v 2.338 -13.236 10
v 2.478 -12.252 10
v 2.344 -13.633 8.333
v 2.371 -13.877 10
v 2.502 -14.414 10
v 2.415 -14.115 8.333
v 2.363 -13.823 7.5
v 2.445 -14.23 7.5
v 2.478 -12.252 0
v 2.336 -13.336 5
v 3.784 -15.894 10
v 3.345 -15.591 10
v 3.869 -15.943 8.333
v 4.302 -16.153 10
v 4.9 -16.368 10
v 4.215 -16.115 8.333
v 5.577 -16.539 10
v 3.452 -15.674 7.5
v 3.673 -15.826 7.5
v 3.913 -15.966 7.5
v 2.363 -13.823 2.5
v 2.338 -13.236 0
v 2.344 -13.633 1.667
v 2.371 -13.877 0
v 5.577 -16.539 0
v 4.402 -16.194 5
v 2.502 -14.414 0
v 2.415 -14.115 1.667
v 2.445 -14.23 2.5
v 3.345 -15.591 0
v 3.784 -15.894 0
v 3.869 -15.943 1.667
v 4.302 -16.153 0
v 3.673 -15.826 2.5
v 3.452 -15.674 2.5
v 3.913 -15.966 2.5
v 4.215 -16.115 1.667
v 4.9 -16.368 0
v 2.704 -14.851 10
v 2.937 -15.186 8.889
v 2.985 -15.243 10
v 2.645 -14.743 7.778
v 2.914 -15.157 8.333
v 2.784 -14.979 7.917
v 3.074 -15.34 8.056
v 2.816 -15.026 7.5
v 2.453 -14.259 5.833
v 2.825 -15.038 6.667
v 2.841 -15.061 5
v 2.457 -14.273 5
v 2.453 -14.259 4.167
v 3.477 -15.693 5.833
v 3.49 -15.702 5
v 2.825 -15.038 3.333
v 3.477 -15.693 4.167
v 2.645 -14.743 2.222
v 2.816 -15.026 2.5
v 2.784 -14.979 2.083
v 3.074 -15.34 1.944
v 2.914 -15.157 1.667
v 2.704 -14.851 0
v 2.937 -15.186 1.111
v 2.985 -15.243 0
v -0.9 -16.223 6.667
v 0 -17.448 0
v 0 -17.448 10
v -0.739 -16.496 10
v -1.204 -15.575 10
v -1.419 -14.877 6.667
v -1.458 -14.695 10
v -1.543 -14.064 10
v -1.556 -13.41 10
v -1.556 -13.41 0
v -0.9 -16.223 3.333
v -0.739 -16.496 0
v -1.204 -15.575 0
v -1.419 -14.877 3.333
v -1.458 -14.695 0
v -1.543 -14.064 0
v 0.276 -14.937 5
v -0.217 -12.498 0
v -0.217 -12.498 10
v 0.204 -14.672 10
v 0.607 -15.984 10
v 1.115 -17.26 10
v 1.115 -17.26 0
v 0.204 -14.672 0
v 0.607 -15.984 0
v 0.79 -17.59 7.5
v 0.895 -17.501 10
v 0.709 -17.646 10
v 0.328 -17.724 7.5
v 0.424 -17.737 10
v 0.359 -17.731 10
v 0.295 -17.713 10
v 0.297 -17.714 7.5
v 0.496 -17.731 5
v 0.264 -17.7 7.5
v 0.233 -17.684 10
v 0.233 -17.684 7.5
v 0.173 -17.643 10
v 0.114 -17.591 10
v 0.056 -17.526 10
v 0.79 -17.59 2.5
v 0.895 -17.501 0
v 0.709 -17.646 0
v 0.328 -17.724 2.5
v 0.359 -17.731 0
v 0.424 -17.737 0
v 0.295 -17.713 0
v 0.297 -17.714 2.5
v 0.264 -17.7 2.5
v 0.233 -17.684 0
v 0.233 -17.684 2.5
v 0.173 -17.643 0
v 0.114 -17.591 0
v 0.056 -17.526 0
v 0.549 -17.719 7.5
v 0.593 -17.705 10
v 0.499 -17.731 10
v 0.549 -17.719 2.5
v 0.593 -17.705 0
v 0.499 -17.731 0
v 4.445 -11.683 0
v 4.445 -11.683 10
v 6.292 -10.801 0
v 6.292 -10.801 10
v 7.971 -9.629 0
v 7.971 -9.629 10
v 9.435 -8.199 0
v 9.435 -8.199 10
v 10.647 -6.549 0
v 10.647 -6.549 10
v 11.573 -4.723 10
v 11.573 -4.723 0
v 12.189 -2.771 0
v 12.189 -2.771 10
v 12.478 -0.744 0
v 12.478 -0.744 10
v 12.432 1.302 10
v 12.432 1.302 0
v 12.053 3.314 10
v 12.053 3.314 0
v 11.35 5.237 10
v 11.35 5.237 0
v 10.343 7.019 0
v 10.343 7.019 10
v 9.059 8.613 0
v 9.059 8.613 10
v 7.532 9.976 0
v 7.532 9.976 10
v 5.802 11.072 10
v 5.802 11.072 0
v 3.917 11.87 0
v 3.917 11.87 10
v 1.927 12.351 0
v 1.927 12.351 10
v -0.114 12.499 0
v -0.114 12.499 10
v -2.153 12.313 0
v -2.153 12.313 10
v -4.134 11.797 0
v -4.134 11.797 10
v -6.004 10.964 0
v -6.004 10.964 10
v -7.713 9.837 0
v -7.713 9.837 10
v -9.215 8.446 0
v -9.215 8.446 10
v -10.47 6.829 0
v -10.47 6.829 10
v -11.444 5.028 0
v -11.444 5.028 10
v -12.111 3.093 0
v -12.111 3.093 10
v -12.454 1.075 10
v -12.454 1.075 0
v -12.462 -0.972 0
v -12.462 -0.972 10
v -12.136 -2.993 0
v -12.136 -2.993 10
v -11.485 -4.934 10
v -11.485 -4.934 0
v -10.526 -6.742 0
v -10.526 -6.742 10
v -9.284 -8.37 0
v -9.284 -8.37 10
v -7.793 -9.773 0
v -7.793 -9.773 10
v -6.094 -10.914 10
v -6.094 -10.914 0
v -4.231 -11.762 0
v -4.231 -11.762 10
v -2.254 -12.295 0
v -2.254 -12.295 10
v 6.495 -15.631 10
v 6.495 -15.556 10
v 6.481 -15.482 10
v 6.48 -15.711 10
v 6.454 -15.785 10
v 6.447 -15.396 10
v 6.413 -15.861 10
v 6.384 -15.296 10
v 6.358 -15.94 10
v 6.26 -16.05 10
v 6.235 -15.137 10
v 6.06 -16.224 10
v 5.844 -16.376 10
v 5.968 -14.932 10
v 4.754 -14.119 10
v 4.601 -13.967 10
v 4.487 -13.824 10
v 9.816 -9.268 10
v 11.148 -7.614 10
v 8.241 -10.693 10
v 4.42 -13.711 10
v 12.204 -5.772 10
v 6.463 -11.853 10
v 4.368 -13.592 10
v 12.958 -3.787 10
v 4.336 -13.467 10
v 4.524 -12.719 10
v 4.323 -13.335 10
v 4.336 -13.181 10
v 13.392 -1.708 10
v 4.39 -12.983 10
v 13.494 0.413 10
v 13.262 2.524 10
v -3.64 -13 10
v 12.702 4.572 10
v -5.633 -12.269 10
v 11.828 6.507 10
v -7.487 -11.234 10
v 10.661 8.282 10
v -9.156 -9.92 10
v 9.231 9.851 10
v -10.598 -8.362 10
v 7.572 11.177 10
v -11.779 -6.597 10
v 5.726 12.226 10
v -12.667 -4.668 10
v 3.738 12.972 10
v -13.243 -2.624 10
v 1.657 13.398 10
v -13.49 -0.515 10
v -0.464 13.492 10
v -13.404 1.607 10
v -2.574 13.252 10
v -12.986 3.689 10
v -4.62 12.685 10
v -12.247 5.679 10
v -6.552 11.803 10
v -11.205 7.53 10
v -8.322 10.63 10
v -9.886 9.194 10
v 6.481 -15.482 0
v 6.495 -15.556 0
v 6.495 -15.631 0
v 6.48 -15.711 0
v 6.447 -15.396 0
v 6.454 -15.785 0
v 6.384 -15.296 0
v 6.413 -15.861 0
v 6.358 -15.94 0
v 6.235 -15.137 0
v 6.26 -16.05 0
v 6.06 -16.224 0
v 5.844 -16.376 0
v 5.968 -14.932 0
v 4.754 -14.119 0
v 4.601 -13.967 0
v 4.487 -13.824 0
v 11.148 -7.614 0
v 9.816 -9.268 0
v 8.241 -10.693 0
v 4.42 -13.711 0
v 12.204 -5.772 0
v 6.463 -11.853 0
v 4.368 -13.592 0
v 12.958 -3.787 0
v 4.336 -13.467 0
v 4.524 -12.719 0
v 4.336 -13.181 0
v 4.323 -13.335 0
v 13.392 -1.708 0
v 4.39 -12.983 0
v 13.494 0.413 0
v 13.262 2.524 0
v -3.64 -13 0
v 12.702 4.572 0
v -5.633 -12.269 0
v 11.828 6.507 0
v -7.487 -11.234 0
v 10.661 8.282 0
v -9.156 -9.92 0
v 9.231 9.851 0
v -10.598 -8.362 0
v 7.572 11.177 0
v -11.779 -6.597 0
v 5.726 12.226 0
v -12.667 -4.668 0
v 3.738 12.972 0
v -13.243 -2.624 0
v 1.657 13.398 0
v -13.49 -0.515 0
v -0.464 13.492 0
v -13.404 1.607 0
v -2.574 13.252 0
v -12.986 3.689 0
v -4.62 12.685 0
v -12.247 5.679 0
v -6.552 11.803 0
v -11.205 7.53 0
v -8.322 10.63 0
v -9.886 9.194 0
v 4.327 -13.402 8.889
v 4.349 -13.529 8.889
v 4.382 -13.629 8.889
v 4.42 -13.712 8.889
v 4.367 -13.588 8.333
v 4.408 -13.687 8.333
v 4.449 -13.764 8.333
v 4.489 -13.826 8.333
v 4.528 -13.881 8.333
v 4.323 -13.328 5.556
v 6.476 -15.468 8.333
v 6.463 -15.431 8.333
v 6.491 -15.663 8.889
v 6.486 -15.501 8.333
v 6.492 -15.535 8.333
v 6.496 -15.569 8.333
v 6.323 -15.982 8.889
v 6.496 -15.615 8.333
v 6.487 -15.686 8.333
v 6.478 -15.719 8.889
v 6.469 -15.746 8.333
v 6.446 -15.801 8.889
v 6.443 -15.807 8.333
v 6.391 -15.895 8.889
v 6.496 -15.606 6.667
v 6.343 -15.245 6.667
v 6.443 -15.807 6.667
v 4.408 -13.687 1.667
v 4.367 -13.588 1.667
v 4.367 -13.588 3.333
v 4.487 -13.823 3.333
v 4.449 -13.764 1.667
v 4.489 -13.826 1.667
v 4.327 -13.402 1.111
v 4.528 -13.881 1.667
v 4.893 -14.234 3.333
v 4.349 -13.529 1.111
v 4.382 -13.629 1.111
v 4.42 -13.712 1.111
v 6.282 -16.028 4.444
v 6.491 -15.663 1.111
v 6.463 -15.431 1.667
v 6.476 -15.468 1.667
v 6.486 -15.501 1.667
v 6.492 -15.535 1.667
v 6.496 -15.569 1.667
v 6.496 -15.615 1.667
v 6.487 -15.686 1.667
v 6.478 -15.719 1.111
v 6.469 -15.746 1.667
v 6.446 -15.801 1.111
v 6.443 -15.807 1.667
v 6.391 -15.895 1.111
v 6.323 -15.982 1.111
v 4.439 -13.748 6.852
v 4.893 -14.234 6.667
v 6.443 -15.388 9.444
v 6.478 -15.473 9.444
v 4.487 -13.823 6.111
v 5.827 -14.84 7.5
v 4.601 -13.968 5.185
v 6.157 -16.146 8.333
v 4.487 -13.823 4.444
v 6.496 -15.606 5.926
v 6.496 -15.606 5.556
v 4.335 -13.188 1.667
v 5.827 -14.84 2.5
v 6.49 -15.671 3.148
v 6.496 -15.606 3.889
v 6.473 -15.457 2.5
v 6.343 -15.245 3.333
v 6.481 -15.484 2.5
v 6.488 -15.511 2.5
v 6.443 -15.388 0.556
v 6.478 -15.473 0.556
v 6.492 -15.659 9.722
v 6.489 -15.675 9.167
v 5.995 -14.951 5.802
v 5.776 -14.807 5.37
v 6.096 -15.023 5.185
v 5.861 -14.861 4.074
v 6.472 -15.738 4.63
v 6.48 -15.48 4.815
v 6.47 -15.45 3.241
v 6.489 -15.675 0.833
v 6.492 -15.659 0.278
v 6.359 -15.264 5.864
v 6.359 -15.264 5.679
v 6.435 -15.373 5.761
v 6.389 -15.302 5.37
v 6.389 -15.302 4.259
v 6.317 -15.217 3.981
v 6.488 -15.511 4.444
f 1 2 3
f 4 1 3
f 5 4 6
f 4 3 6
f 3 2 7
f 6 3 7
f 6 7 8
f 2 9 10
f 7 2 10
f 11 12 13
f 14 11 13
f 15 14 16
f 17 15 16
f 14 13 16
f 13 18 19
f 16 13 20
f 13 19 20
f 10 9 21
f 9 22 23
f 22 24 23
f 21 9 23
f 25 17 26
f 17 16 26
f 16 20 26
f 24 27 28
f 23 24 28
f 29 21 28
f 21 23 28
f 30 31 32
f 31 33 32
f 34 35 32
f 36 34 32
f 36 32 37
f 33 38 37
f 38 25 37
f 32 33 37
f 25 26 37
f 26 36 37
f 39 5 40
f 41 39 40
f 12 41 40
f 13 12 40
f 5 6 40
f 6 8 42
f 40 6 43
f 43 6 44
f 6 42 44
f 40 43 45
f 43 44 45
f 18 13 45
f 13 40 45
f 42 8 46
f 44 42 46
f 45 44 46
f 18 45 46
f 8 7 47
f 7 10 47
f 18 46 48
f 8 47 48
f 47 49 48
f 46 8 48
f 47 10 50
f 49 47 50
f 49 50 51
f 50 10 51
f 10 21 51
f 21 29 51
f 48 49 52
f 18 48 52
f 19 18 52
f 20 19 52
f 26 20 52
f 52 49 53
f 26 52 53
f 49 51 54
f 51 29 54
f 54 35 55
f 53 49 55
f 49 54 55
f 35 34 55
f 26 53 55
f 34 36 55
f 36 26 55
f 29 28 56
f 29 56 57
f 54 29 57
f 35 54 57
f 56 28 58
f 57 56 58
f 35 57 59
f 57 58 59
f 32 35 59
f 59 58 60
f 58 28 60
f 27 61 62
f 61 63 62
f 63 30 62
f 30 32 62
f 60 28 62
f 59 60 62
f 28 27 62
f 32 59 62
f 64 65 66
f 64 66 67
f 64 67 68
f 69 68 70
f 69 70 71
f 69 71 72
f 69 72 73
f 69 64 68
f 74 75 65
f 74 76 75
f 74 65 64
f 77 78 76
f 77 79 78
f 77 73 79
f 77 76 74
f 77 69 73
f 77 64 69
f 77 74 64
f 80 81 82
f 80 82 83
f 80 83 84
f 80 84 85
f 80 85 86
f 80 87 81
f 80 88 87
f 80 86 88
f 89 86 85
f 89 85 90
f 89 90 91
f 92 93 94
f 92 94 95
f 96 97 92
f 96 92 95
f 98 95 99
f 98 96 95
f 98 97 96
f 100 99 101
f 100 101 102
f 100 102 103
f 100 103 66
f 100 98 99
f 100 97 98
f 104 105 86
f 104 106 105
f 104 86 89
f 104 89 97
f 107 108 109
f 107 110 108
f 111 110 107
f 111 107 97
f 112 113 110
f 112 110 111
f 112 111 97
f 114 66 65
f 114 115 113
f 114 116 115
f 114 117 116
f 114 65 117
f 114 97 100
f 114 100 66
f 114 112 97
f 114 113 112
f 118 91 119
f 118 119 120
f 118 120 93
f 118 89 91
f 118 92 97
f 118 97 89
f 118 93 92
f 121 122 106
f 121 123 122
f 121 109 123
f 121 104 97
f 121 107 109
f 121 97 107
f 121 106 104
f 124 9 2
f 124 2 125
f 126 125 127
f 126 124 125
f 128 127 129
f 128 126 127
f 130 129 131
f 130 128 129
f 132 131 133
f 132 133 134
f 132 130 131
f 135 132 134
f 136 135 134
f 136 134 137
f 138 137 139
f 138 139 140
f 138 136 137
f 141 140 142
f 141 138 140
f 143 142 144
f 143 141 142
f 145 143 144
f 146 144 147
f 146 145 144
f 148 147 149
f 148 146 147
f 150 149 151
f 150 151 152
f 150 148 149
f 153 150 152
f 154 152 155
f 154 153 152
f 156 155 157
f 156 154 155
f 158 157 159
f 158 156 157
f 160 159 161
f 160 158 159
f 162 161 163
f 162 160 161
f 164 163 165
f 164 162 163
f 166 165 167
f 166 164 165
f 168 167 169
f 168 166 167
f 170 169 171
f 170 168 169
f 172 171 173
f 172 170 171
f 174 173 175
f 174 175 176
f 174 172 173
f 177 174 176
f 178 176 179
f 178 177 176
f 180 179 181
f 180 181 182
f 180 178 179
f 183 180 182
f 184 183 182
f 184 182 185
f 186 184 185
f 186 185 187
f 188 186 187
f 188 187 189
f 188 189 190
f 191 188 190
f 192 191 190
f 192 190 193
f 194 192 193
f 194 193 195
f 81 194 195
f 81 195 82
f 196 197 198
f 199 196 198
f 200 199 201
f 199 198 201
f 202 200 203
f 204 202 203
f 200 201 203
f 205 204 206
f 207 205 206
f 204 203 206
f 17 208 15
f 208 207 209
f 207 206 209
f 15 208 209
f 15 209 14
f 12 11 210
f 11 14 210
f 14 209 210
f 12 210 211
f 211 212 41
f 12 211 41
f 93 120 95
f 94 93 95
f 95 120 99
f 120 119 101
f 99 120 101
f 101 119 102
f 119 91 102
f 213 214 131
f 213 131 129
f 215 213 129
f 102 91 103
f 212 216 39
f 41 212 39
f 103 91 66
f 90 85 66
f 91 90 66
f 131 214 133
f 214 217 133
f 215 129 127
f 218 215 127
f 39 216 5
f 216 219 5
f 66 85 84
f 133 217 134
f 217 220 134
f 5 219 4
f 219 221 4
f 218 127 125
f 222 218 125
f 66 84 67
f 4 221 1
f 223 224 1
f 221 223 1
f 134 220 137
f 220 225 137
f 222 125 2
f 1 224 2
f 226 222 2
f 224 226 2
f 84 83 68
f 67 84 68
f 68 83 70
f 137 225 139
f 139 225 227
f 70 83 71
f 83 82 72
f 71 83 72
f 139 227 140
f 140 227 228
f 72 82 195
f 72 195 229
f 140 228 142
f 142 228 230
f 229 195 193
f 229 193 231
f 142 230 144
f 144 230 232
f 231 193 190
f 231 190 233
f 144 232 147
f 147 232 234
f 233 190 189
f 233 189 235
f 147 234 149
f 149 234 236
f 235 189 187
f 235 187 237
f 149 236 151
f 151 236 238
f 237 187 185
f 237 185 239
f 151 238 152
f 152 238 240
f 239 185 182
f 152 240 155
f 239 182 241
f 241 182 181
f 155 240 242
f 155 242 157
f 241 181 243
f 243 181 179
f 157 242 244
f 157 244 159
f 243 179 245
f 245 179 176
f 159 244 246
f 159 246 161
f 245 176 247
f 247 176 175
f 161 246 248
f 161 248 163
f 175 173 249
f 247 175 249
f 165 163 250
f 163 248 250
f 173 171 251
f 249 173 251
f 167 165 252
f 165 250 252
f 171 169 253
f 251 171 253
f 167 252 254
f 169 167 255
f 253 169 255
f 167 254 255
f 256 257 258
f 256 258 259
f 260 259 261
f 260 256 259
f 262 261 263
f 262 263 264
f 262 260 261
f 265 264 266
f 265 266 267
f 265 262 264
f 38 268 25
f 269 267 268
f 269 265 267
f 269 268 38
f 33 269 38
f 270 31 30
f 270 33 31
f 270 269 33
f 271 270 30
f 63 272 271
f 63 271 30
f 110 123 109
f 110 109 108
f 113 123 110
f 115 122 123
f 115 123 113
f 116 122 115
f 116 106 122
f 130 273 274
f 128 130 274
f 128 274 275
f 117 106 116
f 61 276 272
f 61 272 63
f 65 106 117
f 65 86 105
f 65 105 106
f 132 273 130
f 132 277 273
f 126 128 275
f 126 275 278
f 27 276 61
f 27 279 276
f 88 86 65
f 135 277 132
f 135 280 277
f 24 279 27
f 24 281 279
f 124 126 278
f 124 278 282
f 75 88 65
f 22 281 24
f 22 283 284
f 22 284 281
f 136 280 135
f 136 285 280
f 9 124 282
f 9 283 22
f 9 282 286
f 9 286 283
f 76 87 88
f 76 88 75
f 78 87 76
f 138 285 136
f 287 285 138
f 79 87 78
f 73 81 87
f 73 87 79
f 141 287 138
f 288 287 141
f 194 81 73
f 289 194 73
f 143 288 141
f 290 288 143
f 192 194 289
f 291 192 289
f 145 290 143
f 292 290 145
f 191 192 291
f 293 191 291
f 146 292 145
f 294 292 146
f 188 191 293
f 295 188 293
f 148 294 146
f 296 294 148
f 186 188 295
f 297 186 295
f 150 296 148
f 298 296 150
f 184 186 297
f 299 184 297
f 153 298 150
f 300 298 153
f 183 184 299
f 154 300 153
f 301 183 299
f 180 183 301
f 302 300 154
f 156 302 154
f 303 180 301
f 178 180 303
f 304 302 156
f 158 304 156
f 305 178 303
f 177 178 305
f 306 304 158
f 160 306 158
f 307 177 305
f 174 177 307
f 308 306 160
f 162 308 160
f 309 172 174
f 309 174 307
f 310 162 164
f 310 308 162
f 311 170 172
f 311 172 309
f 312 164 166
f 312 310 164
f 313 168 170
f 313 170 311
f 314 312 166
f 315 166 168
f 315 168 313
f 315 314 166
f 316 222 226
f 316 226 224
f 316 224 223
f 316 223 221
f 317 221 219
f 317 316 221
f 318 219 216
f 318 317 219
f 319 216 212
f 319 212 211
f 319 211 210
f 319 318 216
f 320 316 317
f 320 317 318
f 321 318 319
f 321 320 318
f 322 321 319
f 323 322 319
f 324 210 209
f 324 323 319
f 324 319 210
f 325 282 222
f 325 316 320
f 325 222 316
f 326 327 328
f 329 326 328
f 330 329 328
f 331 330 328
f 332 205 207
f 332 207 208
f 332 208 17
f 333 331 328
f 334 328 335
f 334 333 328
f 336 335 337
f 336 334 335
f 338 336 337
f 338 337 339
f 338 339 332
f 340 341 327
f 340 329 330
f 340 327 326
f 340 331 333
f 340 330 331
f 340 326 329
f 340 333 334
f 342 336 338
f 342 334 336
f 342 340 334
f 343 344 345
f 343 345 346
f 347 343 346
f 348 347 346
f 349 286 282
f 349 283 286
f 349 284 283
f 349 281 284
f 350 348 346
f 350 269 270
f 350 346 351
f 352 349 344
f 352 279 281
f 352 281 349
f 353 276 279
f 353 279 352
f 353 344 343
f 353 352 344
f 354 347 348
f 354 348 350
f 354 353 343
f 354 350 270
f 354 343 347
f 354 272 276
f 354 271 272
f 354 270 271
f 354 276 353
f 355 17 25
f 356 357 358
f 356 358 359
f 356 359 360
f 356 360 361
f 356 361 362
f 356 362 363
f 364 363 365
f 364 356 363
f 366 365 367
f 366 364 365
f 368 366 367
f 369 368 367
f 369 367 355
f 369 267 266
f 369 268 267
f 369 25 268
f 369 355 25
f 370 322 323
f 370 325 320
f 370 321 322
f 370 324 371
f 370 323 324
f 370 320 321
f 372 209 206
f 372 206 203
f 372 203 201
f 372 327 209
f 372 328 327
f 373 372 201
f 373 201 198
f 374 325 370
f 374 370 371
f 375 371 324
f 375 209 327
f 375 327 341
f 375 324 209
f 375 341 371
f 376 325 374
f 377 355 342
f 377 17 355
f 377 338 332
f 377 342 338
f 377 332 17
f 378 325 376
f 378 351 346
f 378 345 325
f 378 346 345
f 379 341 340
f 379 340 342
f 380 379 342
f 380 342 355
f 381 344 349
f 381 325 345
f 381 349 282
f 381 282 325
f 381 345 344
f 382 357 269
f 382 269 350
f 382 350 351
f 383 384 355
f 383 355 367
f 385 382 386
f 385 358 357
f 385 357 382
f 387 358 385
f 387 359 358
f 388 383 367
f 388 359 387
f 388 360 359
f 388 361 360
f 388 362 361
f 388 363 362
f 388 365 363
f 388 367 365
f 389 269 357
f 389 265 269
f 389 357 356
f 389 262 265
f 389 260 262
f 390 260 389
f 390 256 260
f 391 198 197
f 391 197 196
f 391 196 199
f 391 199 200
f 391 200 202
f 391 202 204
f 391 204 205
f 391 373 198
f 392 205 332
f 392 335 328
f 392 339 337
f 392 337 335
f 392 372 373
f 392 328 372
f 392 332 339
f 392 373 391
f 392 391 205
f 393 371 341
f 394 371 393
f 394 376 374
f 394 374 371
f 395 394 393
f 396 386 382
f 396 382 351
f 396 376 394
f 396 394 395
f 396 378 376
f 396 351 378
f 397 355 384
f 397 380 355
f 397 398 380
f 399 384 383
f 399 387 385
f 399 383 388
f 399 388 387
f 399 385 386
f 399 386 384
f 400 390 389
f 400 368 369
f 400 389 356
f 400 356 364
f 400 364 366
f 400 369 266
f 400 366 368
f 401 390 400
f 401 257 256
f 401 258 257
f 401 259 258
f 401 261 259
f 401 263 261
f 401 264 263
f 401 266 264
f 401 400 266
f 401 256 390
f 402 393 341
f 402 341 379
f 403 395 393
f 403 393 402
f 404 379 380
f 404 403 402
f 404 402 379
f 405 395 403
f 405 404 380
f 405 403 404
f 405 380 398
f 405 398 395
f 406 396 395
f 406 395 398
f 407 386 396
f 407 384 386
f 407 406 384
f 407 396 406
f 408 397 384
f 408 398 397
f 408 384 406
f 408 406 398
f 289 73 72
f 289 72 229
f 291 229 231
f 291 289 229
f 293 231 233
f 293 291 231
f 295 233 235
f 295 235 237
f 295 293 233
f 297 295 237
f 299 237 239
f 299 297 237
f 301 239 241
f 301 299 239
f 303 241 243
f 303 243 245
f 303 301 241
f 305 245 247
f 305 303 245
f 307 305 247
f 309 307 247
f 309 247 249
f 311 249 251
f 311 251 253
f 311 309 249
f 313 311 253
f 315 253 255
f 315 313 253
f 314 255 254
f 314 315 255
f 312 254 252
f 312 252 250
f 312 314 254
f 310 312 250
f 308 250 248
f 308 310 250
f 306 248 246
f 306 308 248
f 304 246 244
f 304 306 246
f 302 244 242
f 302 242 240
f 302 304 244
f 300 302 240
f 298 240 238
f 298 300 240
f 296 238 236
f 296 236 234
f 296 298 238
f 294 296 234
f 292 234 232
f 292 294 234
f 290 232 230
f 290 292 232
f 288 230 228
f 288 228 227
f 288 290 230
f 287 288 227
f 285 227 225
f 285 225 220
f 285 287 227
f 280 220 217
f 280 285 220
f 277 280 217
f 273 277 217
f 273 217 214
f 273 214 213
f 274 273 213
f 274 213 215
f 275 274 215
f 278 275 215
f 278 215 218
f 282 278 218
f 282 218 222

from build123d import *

# Parameters (mm, degrees)
BOSS_EXTRUDE1_DEPTH = 10


with BuildPart() as part:
    # Sketch1 → Boss-Extrude1 (new body)
    with BuildSketch(Plane.XY):
        with BuildLine():
            ThreePointArc((2.47842575, -12.251832753), (-1.137379909, 12.448147129), (-0.217037467, -12.498115647))
            add(Edge.make_bspline(
                [(-0.217037467, -12.498115647), (0.103518304, -14.995056083), (1.115421548, -17.260389343)],
                knots=[0, 0, 0, 1, 1, 1], degree=2))
            add(Edge.make_bspline(
                [(1.115421548, -17.260389343), (0.434564651, -18.108574327), (0, -17.447731212)],
                knots=[0, 0, 0, 1, 1, 1], degree=2))
            add(Edge.make_bspline(
                [(0, -17.447731212), (-1.091166652, -16.283532634), (-1.609840573, -14.937630884), (-1.556021763, -13.410025961)],
                knots=[0, 0, 0, 0, 0.825397526, 0.825397526, 0.825397526, 0.825397526], degree=3))
            ThreePointArc((-1.556021763, -13.410025961), (-1.523641622, 13.413743557), (4.524014275, -12.71940623))
            add(Edge.make_bspline(
                [(4.524014275, -12.71940623), (3.253229228, -14.746642768), (8.549206323, -14.842102086), (5.577194292, -16.538556843)],
                knots=[0, 0, 0, 0, 1, 1, 1, 1], degree=3))
            add(Edge.make_bspline(
                [(2.47842575, -12.251832753), (1.654957901, -15.727340902), (5.577194292, -16.538556843)],
                knots=[0, 0, 0, 1, 1, 1], degree=2))
        make_face()
    extrude(amount=BOSS_EXTRUDE1_DEPTH)


solid = part.part
